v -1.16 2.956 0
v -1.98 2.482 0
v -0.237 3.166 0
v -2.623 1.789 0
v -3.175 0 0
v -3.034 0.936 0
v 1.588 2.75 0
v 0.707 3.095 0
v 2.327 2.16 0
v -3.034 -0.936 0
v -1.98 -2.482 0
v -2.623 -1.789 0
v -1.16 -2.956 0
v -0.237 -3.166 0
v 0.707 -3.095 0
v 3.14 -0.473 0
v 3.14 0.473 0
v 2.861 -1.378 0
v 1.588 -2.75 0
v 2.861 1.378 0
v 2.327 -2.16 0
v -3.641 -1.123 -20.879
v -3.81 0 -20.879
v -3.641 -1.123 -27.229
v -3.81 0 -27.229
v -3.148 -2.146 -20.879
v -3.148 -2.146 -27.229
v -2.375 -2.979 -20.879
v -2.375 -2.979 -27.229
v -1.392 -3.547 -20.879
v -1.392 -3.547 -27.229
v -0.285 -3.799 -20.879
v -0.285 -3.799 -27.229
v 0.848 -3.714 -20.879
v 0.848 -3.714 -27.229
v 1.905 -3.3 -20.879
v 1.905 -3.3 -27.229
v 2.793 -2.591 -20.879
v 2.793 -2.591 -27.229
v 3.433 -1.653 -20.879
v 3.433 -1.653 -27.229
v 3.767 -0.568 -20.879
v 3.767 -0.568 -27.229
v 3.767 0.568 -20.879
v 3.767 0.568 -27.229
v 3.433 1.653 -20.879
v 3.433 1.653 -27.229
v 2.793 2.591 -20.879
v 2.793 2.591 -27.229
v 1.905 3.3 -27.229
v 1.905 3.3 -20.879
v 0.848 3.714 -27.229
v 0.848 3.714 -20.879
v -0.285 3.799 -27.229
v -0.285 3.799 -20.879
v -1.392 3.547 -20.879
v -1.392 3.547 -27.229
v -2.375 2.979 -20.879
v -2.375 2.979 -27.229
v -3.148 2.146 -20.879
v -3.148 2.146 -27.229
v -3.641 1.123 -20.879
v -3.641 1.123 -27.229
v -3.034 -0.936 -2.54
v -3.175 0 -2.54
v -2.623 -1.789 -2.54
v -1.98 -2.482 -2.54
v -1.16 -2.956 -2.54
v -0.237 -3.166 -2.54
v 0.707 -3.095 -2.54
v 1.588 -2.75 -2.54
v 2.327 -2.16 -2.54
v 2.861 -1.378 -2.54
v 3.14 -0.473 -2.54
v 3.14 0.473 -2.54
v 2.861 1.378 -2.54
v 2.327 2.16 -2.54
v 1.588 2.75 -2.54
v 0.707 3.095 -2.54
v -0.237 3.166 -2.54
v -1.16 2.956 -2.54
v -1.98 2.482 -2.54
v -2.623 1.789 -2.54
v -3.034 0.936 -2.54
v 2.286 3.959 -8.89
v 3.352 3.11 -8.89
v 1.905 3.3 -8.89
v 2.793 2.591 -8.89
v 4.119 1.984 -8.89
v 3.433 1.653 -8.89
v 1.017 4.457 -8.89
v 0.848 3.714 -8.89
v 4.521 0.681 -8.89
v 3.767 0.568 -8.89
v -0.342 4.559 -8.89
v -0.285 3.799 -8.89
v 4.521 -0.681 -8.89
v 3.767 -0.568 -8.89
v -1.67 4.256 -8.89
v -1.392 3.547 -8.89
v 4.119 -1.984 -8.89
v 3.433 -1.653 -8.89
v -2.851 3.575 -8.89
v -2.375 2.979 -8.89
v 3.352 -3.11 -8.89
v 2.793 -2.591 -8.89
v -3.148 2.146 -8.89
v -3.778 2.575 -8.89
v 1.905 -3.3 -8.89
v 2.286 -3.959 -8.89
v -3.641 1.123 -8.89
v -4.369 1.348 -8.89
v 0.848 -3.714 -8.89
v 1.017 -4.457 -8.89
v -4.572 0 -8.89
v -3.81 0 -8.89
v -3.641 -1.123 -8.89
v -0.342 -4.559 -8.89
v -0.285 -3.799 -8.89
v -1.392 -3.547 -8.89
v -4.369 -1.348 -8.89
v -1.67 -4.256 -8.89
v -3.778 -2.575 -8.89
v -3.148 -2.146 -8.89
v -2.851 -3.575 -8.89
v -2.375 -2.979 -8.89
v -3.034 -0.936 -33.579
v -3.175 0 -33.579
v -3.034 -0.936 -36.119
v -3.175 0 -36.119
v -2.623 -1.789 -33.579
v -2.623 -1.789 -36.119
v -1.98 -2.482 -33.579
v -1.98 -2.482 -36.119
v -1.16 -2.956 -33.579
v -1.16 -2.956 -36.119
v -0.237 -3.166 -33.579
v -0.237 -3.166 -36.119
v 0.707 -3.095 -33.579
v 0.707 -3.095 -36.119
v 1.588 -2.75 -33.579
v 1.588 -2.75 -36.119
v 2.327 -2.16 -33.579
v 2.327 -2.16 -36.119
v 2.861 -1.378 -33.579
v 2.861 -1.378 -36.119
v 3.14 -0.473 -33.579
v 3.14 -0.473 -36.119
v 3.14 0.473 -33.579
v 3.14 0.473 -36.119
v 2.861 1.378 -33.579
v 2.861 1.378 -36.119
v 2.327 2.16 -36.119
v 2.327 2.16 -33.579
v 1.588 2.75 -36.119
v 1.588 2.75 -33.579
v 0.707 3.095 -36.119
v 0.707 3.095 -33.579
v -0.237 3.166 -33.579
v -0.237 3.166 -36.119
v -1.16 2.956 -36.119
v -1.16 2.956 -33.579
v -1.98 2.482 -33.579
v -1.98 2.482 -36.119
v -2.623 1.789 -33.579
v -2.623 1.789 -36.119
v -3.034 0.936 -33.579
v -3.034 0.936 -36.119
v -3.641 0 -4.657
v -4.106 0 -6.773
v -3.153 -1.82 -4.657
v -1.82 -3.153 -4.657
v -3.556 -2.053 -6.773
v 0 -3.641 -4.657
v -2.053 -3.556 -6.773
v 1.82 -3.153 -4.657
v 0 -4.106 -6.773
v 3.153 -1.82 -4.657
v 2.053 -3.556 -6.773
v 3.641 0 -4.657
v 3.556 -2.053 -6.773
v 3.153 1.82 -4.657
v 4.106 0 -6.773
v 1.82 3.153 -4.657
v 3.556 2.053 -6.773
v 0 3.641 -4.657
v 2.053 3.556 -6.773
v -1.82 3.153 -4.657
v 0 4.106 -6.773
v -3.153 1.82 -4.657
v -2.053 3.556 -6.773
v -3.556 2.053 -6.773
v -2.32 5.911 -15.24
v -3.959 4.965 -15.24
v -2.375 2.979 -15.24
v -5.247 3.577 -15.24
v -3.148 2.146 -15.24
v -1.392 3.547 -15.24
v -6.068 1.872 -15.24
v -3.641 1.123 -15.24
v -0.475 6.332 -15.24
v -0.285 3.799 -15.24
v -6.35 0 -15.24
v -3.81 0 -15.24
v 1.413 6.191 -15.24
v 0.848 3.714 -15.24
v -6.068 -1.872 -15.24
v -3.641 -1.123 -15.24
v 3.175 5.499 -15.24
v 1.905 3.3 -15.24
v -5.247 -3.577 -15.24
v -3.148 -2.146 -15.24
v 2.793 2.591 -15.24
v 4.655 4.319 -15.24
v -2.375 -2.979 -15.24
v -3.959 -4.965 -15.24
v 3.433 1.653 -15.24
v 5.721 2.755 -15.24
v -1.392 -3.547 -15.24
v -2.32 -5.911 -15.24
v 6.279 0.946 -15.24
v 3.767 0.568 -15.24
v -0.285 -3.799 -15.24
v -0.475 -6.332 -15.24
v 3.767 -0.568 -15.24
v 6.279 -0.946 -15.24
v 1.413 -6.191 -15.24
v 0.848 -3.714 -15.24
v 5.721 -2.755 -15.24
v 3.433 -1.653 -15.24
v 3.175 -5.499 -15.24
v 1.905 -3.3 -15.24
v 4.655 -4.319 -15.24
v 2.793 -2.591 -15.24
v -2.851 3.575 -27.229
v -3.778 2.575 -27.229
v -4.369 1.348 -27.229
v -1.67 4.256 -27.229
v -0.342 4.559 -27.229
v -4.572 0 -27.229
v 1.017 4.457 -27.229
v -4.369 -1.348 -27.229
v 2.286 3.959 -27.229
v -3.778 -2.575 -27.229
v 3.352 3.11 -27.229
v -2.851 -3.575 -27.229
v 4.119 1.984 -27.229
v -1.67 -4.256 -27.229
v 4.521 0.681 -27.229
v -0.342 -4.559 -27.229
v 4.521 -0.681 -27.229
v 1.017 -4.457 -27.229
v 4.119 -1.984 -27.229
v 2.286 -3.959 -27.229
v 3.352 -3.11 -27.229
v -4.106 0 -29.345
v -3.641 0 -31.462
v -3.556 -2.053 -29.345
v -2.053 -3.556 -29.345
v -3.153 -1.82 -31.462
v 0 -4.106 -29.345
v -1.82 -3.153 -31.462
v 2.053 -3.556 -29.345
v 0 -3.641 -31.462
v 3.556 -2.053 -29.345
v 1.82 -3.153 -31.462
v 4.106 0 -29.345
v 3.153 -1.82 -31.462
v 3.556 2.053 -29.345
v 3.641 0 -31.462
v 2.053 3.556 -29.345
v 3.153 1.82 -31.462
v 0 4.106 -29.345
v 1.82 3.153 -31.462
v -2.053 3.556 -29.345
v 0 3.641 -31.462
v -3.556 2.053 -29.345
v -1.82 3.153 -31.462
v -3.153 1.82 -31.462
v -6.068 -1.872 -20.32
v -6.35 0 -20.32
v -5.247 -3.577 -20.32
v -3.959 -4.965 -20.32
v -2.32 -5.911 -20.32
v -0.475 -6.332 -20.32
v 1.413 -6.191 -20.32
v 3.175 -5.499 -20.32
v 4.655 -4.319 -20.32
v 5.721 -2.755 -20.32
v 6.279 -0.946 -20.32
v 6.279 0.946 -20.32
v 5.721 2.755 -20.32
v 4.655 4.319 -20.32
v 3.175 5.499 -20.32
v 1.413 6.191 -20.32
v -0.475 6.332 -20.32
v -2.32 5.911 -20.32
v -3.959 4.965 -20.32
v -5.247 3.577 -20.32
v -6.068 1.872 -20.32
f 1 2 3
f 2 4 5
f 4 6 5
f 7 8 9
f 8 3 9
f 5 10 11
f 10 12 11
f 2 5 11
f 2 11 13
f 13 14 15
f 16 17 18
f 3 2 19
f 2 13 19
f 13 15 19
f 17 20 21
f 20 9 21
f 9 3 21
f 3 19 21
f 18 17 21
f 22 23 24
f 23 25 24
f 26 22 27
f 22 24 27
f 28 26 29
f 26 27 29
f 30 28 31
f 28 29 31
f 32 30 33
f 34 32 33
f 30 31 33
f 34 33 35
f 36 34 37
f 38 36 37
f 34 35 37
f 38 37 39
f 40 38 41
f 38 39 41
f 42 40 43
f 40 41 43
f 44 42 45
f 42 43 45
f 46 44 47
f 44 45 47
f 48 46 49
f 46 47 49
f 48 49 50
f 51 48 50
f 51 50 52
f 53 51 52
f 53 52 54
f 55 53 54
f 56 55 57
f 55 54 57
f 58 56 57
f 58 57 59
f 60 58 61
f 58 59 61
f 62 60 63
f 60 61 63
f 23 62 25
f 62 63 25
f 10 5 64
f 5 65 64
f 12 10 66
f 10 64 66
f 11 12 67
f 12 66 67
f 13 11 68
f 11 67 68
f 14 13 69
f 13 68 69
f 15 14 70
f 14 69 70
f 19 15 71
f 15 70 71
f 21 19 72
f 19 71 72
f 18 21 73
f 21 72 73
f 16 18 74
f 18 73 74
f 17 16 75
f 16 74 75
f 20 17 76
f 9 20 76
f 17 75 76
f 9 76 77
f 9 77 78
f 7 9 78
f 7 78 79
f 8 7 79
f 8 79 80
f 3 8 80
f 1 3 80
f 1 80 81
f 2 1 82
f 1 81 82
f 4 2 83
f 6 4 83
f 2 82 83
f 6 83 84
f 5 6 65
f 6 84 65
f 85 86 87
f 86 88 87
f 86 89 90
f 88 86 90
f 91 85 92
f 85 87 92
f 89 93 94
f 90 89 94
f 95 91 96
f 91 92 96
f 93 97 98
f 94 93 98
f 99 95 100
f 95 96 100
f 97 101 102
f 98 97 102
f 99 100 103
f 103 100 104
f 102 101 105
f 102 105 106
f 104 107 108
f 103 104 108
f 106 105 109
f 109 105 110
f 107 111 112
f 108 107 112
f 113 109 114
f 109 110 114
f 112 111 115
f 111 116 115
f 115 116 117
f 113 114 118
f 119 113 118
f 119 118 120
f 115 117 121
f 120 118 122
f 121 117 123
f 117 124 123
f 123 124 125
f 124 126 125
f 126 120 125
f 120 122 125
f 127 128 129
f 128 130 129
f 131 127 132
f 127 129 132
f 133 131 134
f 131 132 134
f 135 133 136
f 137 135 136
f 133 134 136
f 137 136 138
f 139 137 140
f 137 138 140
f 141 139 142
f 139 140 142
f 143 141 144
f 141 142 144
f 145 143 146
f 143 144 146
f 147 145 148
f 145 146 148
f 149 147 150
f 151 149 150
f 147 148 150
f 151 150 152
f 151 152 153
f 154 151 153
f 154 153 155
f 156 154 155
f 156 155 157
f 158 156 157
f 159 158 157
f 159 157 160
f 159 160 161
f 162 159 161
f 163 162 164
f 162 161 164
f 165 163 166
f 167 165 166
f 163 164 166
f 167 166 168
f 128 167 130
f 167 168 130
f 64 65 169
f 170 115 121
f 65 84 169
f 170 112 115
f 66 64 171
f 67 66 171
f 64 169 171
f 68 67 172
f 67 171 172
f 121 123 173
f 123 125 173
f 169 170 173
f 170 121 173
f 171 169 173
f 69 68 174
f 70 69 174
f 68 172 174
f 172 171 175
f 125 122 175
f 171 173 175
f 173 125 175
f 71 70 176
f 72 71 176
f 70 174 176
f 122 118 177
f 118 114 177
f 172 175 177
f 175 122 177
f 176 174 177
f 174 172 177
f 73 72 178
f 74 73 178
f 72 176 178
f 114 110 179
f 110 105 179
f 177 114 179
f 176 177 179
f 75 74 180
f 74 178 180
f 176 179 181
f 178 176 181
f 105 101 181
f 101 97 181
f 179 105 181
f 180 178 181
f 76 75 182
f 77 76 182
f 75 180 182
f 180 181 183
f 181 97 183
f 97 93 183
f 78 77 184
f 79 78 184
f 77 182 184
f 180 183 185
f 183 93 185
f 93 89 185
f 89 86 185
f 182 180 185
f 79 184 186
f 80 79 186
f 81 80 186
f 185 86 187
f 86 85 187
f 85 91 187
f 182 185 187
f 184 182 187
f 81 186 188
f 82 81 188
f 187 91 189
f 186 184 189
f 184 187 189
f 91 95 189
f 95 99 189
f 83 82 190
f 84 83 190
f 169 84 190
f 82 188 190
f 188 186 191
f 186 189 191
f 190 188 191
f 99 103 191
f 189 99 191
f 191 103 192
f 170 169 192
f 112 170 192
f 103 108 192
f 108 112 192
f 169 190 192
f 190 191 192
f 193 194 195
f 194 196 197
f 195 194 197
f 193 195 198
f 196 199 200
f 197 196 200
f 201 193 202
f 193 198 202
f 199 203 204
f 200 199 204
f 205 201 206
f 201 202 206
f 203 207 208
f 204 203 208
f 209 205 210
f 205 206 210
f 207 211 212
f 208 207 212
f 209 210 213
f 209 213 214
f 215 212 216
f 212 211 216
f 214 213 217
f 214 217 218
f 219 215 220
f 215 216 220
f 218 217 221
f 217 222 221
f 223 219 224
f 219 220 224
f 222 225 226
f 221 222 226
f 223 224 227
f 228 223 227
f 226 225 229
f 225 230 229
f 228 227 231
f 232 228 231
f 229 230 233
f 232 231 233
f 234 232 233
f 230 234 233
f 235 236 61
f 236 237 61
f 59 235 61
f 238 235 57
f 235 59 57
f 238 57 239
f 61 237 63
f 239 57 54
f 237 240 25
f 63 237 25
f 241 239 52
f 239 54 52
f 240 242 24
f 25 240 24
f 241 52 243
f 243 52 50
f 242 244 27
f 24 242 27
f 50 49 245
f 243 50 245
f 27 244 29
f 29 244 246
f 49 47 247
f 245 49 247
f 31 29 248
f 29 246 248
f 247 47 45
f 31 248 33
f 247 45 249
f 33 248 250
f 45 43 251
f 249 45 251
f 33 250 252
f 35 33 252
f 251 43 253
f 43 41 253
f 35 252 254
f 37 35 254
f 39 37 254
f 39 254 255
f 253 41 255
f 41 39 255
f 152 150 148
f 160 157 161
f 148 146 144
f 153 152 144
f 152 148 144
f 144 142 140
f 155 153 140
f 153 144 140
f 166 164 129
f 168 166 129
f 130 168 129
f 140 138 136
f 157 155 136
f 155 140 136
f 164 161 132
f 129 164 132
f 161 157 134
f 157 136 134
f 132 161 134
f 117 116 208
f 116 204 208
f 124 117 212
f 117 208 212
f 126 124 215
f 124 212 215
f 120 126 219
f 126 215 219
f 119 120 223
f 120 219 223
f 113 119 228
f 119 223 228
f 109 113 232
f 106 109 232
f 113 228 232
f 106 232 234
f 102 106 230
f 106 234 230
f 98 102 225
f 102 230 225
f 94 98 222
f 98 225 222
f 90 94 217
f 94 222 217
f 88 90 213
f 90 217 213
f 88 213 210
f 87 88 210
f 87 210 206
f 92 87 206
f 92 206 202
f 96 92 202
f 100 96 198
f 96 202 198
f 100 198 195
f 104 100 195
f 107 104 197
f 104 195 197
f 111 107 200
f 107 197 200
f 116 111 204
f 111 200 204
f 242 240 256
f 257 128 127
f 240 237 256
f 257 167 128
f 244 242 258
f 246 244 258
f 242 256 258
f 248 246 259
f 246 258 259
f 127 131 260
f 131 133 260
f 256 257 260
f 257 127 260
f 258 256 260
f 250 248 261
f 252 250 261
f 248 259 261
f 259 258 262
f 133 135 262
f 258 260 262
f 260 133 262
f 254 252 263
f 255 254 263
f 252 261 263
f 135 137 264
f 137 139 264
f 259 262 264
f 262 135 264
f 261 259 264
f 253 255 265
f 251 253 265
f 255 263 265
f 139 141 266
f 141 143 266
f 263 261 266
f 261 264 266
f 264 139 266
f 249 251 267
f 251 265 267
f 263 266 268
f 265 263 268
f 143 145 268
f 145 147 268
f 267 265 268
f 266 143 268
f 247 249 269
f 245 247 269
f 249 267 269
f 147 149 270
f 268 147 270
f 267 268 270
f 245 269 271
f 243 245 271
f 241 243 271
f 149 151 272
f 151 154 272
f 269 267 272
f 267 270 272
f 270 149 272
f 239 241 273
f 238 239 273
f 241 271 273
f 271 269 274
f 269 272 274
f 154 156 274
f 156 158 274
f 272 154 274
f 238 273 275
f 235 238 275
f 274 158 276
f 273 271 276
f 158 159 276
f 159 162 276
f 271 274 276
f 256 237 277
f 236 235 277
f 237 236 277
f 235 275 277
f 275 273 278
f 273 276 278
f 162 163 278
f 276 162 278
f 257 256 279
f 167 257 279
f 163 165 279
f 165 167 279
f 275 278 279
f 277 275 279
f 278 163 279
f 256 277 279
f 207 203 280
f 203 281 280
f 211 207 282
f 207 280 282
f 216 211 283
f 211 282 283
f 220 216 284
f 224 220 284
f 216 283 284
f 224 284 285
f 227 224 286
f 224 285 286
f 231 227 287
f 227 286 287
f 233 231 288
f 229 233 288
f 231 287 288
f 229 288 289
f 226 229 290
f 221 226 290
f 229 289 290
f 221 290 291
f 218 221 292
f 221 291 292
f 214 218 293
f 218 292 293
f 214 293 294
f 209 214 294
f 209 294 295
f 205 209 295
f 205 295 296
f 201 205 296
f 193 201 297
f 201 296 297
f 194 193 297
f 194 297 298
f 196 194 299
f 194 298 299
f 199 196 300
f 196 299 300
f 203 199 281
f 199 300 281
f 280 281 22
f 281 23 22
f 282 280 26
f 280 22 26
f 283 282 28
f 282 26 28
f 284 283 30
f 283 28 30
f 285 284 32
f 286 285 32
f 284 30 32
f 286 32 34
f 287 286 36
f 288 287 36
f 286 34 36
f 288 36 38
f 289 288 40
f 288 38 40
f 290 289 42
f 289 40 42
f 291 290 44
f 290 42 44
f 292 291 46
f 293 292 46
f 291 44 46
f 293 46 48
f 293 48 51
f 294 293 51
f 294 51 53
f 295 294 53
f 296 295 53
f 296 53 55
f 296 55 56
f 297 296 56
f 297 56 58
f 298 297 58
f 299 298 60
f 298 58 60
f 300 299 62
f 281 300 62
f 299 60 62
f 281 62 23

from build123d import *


with BuildPart() as part:
    # Sketch1 → Revolve1 (revolve)
    with BuildSketch(Plane(origin=(0, 0, 0), x_dir=(0, 0, -1), z_dir=(1, 0, 0)), mode=Mode.PRIVATE) as revolve1_sk:
        Polygon((0, 0), (0, 3.175), (2.54, 3.175), (8.89, 4.572), (8.89, 3.81), (15.24, 3.81), (15.24, 6.35), (20.32, 6.35), (20.8788, 3.81), (27.2288, 3.81), (27.2288, 4.572), (33.5788, 3.175), (36.1188, 3.175), (36.1188, 0), align=None)
    revolve(revolve1_sk.sketch.rotate(Axis((0, 0, -36.1188), (0, 0, 1)), 90), axis=Axis((0, 0, -36.1188), (0, 0, 1)))


solid = part.part
